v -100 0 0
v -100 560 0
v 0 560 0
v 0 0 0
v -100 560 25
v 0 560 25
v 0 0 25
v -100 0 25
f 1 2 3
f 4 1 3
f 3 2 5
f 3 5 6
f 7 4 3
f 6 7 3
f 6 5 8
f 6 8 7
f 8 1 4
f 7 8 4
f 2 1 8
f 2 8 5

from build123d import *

# Parameters (mm, degrees)
F0_W     = 100
F0_H     = 560
F1_DEPTH = 25
F2_DEPTH = 25
F3_DEPTH = 25
F4_DEPTH = 25


with BuildPart() as f1:
    # F0 (on Top) → F1 (new body)
    with BuildSketch(Plane.XY):
        with Locations((-50, 280)):
            Rectangle(F0_W, F0_H)
    extrude(amount=F1_DEPTH)

    # F0 (on Top) → F2 (join)
    with BuildSketch(Plane.XY):
        with Locations((-50, 280)):
            Rectangle(F0_W, F0_H)
    extrude(amount=F2_DEPTH)

    # F0 (on Top) → F3 (join)
    with BuildSketch(Plane.XY):
        with Locations((-50, 280)):
            Rectangle(F0_W, F0_H)
    extrude(amount=F3_DEPTH)

    # F0 (on Top) → F4 (join)
    with BuildSketch(Plane.XY):
        with Locations((-50, 280)):
            Rectangle(F0_W, F0_H)
    extrude(amount=F4_DEPTH)


solid = f1.part
